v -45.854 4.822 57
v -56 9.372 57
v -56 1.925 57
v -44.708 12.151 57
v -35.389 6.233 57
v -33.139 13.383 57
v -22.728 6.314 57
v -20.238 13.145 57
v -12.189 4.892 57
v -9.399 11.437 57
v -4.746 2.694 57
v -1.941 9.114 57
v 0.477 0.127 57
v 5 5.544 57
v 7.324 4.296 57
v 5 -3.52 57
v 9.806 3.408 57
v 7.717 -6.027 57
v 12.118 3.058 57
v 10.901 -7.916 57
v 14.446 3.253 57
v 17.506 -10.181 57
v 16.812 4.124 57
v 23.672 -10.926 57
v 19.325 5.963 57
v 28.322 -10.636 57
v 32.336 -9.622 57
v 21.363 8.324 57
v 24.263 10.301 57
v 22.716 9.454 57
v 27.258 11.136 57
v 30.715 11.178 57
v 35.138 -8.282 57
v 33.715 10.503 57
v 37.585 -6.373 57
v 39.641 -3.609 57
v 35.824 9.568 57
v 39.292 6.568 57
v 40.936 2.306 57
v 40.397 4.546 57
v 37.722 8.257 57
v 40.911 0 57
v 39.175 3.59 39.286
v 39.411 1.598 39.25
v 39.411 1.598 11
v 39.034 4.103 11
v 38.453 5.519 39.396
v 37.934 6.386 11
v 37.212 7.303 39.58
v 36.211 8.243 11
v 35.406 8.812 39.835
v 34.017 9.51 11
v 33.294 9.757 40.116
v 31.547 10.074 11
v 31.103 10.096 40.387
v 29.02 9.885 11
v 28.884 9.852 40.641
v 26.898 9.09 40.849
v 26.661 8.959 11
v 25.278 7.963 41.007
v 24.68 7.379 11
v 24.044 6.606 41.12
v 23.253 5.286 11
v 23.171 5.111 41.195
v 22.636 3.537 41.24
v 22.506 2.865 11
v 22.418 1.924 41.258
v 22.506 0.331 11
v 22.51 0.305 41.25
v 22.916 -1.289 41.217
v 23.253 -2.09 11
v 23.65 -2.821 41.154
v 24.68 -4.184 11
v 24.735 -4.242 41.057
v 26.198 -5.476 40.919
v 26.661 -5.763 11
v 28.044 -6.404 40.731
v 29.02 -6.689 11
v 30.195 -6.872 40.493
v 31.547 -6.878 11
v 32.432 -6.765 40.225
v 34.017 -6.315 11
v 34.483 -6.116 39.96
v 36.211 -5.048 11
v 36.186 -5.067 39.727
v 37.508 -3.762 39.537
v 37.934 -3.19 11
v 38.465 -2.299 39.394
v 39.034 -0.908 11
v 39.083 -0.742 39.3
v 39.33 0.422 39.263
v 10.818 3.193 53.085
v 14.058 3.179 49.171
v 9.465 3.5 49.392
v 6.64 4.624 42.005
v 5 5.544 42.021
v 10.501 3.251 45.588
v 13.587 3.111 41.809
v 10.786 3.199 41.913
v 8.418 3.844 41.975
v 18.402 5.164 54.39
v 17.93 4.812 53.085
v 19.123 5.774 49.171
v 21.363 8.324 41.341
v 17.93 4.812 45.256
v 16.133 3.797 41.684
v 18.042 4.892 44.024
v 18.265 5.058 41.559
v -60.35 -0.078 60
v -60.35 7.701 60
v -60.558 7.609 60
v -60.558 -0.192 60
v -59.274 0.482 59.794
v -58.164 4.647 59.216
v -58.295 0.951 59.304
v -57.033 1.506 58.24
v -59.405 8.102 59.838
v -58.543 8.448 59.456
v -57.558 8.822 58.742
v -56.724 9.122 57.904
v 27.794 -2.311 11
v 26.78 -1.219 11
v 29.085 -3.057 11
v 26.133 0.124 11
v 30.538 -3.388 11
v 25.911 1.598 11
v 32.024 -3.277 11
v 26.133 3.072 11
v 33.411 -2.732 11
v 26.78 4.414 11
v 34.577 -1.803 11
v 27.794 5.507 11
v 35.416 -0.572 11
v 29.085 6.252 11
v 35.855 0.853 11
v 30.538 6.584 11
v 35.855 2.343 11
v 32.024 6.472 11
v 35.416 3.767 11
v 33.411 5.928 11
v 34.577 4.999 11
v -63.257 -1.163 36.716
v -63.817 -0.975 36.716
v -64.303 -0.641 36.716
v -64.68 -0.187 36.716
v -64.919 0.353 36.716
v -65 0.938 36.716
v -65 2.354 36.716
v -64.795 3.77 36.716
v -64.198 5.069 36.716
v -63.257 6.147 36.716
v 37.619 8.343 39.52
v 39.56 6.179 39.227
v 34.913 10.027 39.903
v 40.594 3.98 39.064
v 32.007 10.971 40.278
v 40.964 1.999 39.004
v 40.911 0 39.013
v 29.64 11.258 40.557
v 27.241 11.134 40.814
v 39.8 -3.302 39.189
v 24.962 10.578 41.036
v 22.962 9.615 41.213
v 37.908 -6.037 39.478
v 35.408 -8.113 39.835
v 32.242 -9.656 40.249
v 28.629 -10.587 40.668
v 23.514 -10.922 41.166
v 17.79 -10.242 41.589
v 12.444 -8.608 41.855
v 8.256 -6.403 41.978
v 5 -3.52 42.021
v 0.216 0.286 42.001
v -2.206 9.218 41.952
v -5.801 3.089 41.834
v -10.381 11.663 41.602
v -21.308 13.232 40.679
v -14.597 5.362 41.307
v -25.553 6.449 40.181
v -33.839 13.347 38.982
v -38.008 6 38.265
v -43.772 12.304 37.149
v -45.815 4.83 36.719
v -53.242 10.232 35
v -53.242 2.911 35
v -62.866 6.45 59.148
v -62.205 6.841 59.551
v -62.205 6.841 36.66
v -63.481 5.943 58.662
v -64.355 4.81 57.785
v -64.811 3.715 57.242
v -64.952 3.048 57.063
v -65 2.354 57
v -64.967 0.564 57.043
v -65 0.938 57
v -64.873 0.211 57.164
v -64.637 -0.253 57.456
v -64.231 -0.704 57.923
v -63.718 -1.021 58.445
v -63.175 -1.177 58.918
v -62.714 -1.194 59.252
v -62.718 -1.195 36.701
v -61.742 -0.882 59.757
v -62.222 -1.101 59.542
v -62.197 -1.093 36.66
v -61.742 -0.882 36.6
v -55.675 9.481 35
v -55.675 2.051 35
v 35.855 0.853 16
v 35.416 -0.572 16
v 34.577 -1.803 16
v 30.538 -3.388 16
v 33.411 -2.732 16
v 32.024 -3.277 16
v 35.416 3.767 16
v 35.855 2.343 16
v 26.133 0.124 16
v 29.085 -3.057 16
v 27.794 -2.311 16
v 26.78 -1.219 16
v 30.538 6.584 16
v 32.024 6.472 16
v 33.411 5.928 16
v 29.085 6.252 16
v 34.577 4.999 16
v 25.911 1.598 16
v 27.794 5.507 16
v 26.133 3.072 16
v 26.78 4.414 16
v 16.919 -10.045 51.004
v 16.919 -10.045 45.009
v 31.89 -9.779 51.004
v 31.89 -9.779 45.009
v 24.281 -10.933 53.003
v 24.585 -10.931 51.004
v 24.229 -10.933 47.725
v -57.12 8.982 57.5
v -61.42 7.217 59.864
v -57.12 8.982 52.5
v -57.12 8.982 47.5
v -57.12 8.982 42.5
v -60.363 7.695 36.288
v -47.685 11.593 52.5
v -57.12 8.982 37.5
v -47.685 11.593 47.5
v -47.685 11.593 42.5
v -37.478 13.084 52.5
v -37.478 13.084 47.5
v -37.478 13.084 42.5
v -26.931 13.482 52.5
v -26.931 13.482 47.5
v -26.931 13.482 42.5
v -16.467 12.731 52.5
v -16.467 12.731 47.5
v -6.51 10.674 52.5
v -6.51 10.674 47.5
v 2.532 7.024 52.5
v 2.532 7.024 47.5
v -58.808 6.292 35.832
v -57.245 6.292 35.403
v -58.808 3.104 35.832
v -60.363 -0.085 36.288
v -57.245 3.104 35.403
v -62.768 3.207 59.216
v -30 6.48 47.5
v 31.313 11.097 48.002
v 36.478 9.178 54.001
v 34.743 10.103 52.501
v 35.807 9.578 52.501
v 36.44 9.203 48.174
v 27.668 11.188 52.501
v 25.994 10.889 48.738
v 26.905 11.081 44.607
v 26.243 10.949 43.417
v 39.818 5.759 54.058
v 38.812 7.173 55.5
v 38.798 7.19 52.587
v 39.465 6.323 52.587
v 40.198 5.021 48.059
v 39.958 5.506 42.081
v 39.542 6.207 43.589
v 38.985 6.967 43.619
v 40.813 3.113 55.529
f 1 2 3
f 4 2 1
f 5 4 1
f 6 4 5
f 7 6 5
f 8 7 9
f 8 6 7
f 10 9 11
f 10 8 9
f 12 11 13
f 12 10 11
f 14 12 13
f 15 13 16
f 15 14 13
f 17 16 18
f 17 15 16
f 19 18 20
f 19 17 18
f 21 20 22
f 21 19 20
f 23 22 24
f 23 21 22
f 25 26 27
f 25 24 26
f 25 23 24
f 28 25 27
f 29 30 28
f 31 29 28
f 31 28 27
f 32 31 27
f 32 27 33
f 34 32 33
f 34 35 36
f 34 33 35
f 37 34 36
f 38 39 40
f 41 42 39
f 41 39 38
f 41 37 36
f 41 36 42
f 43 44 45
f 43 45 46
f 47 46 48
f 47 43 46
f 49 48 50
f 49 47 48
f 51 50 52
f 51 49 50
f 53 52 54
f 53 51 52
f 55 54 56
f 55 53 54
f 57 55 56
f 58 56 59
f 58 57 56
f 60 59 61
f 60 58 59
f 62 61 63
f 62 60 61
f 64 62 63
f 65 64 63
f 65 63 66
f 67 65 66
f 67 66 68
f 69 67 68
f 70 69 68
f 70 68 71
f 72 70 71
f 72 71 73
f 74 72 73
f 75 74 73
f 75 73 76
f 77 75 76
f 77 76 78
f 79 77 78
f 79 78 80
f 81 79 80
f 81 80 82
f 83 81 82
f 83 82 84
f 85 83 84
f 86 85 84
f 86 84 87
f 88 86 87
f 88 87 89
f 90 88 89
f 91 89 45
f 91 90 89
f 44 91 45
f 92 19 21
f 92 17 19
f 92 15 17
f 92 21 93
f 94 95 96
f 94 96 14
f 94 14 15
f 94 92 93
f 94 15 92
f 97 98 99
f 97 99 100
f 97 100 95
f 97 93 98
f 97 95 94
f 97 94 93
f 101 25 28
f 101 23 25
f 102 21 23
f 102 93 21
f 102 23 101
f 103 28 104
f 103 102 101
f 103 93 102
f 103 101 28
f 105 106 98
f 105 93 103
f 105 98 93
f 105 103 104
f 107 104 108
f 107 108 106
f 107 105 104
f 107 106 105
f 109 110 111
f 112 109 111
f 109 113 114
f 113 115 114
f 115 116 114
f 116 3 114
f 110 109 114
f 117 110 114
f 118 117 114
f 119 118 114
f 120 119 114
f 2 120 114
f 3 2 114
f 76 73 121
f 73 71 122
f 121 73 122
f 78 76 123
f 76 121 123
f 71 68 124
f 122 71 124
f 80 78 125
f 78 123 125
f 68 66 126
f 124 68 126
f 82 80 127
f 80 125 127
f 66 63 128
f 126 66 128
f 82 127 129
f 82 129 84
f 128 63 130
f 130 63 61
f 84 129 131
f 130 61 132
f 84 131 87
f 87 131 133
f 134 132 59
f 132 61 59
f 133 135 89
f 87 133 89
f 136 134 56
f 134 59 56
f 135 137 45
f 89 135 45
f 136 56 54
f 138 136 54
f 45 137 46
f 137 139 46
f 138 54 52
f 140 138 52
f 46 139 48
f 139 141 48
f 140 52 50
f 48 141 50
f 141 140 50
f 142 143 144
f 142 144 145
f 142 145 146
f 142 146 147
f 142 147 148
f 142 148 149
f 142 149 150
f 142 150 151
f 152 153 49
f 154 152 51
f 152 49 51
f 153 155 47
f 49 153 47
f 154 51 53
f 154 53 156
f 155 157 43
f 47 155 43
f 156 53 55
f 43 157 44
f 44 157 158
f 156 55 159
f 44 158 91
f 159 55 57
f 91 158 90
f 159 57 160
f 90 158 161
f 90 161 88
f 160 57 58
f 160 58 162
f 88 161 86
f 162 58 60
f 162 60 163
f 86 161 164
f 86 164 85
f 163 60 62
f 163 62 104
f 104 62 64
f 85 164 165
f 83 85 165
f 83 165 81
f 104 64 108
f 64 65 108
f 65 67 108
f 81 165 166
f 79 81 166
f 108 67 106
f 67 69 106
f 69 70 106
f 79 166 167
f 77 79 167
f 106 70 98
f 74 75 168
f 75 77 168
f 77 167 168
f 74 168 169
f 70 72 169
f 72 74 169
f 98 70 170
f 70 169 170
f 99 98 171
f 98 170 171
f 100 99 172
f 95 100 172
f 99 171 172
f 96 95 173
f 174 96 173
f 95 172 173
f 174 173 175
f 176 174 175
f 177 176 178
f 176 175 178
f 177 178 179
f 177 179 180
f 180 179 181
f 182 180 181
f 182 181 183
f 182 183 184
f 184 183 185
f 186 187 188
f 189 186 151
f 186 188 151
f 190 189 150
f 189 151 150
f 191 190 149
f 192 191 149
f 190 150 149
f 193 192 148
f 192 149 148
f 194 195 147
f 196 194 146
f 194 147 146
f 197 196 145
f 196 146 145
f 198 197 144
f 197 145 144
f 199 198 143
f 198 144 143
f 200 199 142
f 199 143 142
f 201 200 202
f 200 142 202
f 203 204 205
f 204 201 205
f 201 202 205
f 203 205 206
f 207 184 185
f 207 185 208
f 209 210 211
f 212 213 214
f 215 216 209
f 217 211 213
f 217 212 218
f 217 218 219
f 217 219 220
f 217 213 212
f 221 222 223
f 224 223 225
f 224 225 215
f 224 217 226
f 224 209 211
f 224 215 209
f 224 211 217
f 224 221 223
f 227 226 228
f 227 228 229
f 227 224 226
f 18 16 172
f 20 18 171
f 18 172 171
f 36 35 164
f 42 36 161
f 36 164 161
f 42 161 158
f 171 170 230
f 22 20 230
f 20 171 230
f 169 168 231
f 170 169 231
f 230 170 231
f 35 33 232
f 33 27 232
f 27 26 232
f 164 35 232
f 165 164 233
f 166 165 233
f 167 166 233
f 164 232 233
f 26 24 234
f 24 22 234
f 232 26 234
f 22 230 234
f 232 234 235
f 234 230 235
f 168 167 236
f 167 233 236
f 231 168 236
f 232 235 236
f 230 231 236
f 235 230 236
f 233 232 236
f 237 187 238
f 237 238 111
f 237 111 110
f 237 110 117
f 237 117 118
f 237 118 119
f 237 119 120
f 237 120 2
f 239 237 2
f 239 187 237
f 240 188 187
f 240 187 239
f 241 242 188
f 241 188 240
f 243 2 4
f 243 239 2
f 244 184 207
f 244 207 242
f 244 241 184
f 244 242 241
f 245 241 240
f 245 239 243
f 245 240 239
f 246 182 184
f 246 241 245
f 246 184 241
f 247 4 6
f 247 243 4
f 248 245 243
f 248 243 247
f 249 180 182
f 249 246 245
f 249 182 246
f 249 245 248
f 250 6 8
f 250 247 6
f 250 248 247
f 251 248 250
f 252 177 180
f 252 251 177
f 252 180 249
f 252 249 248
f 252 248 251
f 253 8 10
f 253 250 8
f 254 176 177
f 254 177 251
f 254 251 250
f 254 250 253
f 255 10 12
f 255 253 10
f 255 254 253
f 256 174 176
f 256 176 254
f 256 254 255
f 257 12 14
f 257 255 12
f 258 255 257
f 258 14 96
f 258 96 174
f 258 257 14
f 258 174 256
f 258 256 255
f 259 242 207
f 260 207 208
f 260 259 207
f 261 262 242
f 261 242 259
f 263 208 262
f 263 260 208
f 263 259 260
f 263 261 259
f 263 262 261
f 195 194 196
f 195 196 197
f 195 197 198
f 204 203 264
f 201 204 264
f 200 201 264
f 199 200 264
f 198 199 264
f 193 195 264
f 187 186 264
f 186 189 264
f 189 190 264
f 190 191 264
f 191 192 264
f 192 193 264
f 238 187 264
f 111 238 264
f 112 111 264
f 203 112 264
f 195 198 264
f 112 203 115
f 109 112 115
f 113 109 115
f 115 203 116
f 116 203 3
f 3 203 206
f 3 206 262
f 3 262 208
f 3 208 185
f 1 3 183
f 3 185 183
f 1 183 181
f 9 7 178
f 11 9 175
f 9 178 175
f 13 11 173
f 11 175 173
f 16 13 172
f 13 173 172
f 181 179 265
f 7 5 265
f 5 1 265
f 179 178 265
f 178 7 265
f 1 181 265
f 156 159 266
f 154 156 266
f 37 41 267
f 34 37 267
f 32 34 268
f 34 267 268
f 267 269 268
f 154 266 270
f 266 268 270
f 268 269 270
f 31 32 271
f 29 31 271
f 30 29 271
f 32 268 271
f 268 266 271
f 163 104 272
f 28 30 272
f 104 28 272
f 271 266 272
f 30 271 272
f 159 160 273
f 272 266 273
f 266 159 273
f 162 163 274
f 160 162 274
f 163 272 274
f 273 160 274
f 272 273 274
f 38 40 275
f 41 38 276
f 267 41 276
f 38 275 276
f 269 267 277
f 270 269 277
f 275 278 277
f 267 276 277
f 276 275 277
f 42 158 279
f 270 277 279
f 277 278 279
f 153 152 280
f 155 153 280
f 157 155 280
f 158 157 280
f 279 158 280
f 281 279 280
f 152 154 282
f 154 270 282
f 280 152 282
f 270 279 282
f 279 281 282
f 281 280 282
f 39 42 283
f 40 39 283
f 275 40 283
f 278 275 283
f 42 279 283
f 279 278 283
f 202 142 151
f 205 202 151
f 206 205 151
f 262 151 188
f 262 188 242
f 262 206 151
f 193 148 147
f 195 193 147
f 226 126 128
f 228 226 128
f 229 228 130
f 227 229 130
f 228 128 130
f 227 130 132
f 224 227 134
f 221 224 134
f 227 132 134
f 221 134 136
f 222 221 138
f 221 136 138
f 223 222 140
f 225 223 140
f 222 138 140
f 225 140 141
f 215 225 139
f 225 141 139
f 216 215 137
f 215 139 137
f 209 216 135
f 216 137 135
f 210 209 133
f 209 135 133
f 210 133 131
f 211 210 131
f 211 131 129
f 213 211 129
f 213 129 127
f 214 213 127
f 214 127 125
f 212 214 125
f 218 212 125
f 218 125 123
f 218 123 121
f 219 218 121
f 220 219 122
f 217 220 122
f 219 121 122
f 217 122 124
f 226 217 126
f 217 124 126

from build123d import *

# Parameters (mm, degrees)
SKETCH_1_W               = 140
SKETCH_1_H               = 40
EXTRUDE_1_DEPTH          = 35
EXTRUDE_2_DEPTH          = 25
SKETCH_3_W               = 140
SKETCH_3_H               = 40
CUT_EXTRUDE_1_DEPTH      = 35
CUT_EXTRUDE_3_DEPTH      = 35
CUT_EXTRUDE_3_DEPTH_BACK = 35
CUT_EXTRUDE_4_DEPTH      = 35
CUT_EXTRUDE_4_DEPTH_BACK = 35
SKETCH_7_R               = 8.5
EXTRUDE_3_DEPTH          = 46
SKETCH_8_R               = 5
CUT_EXTRUDE_5_DEPTH      = 5


# Read off the part's stored shape, not the designer's step: 凸台-拉伸2
with BuildPart() as part:
    # 草图1 → 凸台-拉伸1 (new body)
    with BuildSketch(Plane.XY):
        Rectangle(SKETCH_1_W, SKETCH_1_H)
    extrude(amount=EXTRUDE_1_DEPTH)

    # 凸台-拉伸2 outline → 凸台-拉伸2 (add)
    with BuildSketch(Plane.XY.offset(35)):
        with BuildLine():
            add(Edge.make_bspline(
                [(4.99979571, 5.544461103), (14.93503193, -0.57740686), (21.362876996, 8.324395915)],
                knots=[6.93e-07, 6.93e-07, 6.93e-07, 1, 1, 1], degree=2))
            add(Edge.make_bspline(
                [(-62.204901581, 6.84122677), (-61.92798769, 6.977283921), (-60.294583456, 7.758325304), (-55.702877861, 9.628058542), (-47.815957259, 11.775440787), (-37.533060807, 13.26503558), (-26.917650518, 13.670745136), (-16.380744799, 12.945092857), (-6.360189442, 10.9325016), (0.253451635, 8.349640422), (3.857061157, 6.27680637), (4.666883474, 5.764061136), (4.99979571, 5.544461103)],
                knots=[0.117295231, 0.117295231, 0.117295231, 0.117295231, 0.129103067, 0.186305898, 0.302547913, 0.418789927, 0.535031942, 0.651273956, 0.767515971, 0.883757985, 0.904141366, 0.918671815, 0.918671815, 0.918671815, 0.918671815], degree=3))
            ThreePointArc((-62.204901581, 6.84122677), (-64.244084584, 4.997077414), (-65, 2.353642897))
            Line((-65, 2.353642897), (-65, 0.938055763))
            ThreePointArc((-65, 0.938055763), (-63.904973445, -0.928026304), (-61.741817309, -0.882190007))
            add(Edge.make_bspline(
                [(-61.741817309, -0.882190007), (-54.274901725, 3.714814791), (-28.022038825, 9.247775757), (-1.769175925, 3.780623693), (5, -3.520342201)],
                knots=[0.070063884, 0.070063884, 0.070063884, 0.070063884, 0.5, 1, 1, 1, 1], degree=3))
            add(Edge.make_bspline(
                [(5, -3.520342201), (12.391425527, -12.533975981), (37.865765315, -15.442874495), (40.911305501, 0)],
                knots=[0, 0, 0, 0, 1, 1, 1, 1], degree=3))
            add(Edge.make_bspline(
                [(40.911305501, 0), (41.685623973, 6.326172477), (33.243695942, 12.959768139), (23.757997073, 10.791133007), (21.362876996, 8.324395915)],
                knots=[0.14862794, 0.14862794, 0.14862794, 0.14862794, 0.452578319, 0.661483353, 0.661483353, 0.661483353, 0.661483353], degree=3))
        make_face()
    extrude(amount=EXTRUDE_2_DEPTH)

    # 草图3 → 切除-拉伸1 (cut)
    with BuildSketch(Plane(origin=(0, 0, 0), x_dir=(-1, 0, 0), z_dir=(0, 0, -1))):
        Rectangle(SKETCH_3_W, SKETCH_3_H)
    extrude(amount=-CUT_EXTRUDE_1_DEPTH, mode=Mode.SUBTRACT)

    # 草图4 → 切除-拉伸3 (cut, two sides: drawn at the far end of the back side and taken through both)
    with BuildSketch(Plane(origin=(0, 0, 0), x_dir=(1, 0, 0), z_dir=(0, 1, 0)).offset(-CUT_EXTRUDE_3_DEPTH_BACK)):
        with BuildLine():
            Line((40.990847483, -57), (-56, -57))
            add(Edge.make_bspline(
                [(-60.349653835, -60), (-58.152730496, -59.93219396), (-56, -57)],
                knots=[0.511562339, 0.511562339, 0.511562339, 1, 1, 1], degree=2))
            Line((-60.349653835, -60), (40.990847483, -60))
            Line((40.990847483, -60), (40.990847483, -57))
        make_face()
        with BuildLine():
            Line((-65, -60), (-60.557775934, -60))
            add(Edge.make_bspline(
                [(-65, -57), (-62.756791546, -59.93219396), (-60.557775934, -60)],
                knots=[0, 0, 0, 0.488437661, 0.488437661, 0.488437661], degree=2))
            Line((-65, -57), (-65, -60))
        make_face()
    extrude(amount=CUT_EXTRUDE_3_DEPTH + CUT_EXTRUDE_3_DEPTH_BACK, mode=Mode.SUBTRACT)

    # 草图6 → 切除-拉伸4 (cut, two sides: drawn at the far end of the back side and taken through both)
    with BuildSketch(Plane(origin=(0, 0, 0), x_dir=(1, 0, 0), z_dir=(0, 1, 0)).offset(-CUT_EXTRUDE_4_DEPTH_BACK)):
        with BuildLine():
            Line((40.990847483, -35), (21.362876991, -35))
            Line((21.362876991, -35), (-53.242217102, -35))
            add(Edge.make_bspline(
                [(40.990847483, -39), (-6.258890193, -46.635238136), (-53.242217102, -35)],
                knots=[0, 0, 0, 1, 1, 1], degree=2))
            Line((40.990847483, -39), (40.990847483, -35))
        make_face()
        with BuildLine():
            Line((-65, -36.715937701), (-63.25720797, -36.715937701))
            ThreePointArc((-63.25720797, -36.715937701), (-61.794491028, -36.60838225), (-60.363238722, -36.288029531))
            add(Edge.make_bspline(
                [(-60.363238722, -36.288029531), (-58.81156844, -35.818906777), (-57.248394022, -35.38946773), (-55.674749287, -35)],
                knots=[0.228745815, 0.228745815, 0.228745815, 0.228745815, 1, 1, 1, 1], degree=3))
            Line((-55.674749287, -35), (-65, -35))
            Line((-65, -35), (-65, -36.715937701))
        make_face()
    extrude(amount=CUT_EXTRUDE_4_DEPTH + CUT_EXTRUDE_4_DEPTH_BACK, mode=Mode.SUBTRACT)

    # 草图7 → 凸台-拉伸3 (add)
    with BuildSketch(Plane.XY.offset(57)):
        with Locations((30.911305501, 1.597813248)):
            Circle(SKETCH_7_R)
    extrude(amount=-EXTRUDE_3_DEPTH)

    # 草图8 → 切除-拉伸5 (cut)
    with BuildSketch(Plane(origin=(0, 0, 11), x_dir=(-1, 0, 0), z_dir=(0, 0, -1))):
        with Locations((-30.911305501, 1.597813248)):
            Circle(SKETCH_8_R)
    extrude(amount=-CUT_EXTRUDE_5_DEPTH, mode=Mode.SUBTRACT)


solid = part.part
